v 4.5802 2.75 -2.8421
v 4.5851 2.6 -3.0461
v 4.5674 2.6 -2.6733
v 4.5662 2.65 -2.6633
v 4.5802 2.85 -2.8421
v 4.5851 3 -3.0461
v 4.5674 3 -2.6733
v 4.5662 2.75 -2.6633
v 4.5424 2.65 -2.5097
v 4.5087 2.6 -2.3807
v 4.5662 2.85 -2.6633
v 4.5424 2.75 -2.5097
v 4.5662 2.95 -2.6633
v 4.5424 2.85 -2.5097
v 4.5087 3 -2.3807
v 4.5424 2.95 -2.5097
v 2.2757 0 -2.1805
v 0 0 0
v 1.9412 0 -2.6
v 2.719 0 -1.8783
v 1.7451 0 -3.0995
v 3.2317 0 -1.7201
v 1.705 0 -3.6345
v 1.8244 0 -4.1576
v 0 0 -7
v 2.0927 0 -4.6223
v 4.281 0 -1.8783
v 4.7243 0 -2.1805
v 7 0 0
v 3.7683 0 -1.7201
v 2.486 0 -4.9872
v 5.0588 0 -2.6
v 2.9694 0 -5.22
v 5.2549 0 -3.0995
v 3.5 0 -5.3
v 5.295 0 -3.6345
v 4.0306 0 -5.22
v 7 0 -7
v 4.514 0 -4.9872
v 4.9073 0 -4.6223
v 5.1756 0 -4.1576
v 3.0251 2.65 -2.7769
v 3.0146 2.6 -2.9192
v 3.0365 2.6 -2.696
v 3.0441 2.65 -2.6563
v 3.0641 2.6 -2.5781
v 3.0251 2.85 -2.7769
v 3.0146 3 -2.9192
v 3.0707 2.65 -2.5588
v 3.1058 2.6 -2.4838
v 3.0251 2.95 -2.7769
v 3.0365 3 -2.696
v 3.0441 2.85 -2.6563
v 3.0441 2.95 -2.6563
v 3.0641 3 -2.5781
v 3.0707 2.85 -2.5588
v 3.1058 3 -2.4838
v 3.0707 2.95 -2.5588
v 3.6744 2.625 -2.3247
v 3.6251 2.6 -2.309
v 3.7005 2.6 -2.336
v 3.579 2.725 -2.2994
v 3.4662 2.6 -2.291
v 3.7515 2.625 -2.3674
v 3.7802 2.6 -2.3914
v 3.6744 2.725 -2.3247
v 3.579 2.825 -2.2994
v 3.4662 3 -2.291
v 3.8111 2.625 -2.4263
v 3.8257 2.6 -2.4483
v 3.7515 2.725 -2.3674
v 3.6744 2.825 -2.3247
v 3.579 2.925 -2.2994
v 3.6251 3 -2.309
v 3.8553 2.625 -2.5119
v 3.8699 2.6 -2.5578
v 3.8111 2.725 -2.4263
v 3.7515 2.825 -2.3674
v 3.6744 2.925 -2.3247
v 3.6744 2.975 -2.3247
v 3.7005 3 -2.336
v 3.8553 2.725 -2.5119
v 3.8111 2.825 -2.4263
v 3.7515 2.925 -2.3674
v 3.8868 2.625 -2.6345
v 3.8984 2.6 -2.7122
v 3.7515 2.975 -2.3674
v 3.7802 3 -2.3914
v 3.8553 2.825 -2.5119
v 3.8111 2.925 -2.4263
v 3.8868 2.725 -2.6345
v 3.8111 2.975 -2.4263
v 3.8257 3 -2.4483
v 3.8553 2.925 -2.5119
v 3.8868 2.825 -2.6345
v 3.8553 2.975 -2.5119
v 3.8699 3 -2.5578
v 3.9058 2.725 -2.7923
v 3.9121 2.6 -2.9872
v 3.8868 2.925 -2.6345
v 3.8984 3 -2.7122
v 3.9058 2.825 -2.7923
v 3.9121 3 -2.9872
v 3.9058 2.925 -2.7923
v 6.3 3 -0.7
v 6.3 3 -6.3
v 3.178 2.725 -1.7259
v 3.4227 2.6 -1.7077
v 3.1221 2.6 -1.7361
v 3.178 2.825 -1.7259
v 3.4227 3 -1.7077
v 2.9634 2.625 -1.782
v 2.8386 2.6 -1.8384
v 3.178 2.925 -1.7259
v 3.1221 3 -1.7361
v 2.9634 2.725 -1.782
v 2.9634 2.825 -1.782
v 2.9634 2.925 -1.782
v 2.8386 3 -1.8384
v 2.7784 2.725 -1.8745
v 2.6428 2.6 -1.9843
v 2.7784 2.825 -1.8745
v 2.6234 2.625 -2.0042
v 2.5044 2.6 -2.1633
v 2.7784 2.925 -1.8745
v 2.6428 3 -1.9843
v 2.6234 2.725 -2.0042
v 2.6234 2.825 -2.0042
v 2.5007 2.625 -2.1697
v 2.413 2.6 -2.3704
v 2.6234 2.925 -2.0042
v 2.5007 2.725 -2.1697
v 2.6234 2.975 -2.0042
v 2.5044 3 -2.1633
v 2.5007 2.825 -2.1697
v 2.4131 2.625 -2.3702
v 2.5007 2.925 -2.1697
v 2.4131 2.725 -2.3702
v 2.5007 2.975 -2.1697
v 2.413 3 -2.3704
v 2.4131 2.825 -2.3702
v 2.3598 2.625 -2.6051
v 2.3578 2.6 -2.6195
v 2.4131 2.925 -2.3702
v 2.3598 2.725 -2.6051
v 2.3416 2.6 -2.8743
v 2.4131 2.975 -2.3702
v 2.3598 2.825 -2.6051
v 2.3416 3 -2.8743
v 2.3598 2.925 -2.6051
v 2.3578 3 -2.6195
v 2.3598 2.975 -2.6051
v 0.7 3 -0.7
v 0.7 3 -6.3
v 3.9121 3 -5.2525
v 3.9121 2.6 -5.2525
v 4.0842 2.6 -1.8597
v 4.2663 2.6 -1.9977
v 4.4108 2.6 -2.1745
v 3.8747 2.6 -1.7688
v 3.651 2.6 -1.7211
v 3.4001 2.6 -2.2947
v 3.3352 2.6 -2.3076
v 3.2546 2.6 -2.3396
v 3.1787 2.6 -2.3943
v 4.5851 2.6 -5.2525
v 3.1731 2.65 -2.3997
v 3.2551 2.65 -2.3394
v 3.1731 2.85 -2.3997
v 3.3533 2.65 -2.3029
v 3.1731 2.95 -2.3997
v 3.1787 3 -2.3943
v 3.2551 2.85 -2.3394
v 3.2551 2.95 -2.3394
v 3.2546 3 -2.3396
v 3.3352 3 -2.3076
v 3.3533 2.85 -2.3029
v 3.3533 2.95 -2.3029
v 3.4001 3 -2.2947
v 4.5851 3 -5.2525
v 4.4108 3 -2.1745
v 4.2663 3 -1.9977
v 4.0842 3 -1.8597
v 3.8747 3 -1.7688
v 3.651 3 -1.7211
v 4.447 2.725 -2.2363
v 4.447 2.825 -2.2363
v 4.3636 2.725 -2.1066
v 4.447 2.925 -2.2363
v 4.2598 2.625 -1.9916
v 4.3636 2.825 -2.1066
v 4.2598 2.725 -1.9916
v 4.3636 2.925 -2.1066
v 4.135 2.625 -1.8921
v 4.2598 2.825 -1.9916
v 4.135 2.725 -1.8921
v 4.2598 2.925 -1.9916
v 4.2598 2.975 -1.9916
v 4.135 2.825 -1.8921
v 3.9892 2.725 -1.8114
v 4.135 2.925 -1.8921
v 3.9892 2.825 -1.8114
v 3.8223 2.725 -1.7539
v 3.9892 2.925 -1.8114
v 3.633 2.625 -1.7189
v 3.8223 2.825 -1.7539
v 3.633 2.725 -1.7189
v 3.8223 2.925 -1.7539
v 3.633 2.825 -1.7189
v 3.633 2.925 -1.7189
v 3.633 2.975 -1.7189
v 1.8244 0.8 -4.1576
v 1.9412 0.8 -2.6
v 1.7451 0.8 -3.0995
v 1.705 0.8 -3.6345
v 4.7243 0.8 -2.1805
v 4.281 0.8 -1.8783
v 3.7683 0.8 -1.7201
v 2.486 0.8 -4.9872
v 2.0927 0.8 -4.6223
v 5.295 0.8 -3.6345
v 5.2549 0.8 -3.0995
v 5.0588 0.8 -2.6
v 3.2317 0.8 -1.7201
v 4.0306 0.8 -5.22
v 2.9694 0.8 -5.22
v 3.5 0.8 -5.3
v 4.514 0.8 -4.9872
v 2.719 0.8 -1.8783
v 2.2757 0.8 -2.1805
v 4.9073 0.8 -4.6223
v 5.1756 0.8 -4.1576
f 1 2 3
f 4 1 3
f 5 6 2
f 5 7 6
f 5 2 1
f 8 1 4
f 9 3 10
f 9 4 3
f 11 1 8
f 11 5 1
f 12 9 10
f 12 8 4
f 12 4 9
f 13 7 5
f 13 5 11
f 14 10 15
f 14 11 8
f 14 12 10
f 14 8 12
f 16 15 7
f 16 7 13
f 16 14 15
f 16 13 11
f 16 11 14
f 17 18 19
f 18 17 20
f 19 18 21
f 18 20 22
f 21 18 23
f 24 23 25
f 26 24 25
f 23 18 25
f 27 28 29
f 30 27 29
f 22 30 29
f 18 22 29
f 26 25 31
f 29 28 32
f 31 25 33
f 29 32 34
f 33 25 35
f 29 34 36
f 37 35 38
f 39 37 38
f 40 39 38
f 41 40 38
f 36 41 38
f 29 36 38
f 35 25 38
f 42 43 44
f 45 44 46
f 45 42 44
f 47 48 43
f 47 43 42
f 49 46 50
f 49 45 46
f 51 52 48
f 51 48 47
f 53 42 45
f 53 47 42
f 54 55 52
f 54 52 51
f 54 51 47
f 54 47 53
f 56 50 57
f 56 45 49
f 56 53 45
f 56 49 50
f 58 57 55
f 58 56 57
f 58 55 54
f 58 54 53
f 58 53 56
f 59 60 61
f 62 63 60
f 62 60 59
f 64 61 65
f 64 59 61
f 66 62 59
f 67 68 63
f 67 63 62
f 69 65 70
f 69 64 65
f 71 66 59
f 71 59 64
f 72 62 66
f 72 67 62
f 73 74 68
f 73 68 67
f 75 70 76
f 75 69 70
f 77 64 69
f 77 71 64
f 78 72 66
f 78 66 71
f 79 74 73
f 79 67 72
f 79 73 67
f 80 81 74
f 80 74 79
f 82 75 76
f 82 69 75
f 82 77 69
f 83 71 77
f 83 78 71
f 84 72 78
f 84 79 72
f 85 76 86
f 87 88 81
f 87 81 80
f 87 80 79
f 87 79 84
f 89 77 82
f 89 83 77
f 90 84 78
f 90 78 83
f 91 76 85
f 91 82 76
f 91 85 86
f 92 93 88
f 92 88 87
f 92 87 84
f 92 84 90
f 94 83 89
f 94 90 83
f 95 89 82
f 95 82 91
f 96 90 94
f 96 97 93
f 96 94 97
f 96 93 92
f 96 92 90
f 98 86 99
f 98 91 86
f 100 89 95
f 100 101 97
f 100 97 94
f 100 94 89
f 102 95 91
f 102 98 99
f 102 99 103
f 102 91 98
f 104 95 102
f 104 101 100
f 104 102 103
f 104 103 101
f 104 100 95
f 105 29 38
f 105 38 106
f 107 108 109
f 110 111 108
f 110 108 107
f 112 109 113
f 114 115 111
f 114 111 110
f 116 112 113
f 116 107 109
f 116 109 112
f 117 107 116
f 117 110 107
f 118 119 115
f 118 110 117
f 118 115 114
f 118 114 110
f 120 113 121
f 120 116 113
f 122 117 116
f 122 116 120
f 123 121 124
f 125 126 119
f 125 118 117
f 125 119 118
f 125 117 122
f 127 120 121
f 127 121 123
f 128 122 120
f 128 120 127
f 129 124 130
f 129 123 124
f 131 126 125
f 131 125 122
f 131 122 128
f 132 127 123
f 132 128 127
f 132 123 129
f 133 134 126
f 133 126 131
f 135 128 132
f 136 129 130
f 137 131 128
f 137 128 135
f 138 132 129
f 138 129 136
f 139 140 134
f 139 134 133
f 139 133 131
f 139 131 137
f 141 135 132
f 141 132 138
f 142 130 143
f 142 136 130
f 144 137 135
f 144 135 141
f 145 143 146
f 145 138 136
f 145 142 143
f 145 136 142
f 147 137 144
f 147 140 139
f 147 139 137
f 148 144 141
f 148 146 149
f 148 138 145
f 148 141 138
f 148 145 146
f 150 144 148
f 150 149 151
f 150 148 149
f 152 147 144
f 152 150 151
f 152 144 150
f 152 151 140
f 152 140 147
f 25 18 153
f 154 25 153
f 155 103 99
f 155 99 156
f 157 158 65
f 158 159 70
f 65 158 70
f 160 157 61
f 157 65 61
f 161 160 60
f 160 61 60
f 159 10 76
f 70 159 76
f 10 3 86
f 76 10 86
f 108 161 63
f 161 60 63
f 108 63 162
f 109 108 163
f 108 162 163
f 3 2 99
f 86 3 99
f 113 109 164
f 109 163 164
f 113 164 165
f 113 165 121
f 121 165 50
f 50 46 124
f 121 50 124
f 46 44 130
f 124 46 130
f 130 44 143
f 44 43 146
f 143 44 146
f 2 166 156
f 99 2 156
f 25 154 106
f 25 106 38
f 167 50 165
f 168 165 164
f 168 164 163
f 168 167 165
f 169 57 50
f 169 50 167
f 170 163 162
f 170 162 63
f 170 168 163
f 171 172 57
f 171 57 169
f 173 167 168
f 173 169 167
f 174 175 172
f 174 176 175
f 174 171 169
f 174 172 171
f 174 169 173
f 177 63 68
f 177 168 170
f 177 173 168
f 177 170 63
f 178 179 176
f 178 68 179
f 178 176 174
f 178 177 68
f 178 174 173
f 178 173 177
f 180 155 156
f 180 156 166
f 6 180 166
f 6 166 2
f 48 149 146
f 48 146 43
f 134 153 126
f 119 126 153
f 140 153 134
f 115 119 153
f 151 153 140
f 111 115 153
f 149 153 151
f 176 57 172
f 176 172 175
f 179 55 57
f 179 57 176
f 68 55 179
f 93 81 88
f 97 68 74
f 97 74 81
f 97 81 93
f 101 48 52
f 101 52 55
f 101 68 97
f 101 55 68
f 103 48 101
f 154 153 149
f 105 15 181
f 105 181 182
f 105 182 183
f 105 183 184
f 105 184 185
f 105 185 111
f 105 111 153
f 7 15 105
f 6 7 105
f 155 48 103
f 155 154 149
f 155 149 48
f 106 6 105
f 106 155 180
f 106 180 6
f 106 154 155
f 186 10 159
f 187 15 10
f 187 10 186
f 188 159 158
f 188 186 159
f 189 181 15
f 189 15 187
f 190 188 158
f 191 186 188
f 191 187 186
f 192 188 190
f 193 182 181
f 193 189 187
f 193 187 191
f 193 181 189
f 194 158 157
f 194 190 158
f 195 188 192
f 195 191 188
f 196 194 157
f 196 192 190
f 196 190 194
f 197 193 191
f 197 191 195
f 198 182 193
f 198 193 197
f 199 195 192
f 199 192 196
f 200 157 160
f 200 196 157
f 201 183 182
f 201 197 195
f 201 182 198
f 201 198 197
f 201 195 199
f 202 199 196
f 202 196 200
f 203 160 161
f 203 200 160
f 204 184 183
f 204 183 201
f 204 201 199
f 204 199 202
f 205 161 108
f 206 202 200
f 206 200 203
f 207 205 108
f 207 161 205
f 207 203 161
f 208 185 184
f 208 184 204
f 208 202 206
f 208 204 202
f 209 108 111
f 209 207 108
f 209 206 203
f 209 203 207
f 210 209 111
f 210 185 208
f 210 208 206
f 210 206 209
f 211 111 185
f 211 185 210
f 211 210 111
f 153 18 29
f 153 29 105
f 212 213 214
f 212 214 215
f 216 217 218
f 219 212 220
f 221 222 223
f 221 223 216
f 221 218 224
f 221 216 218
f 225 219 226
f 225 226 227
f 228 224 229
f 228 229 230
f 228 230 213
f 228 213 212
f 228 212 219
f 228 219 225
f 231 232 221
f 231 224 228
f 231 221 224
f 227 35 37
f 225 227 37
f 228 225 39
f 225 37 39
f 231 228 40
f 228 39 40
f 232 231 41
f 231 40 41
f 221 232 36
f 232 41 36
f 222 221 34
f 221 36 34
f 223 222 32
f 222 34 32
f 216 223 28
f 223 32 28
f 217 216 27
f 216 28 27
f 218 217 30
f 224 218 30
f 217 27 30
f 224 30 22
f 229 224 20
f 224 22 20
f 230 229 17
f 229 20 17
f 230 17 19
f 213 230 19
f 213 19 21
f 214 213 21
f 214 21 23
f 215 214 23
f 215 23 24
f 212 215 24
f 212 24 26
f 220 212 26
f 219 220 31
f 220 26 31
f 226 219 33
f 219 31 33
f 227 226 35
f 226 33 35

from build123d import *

# Parameters (mm, degrees)
SKETCH1_W           = 7
SKETCH1_H           = 7
BOSS_EXTRUDE1_DEPTH = 3
CUT_EXTRUDE1_DEPTH  = 7
CUT_EXTRUDE2_DEPTH  = 11
SKETCH4_R           = 1.8
CUT_EXTRUDE3_DEPTH  = 0.8
CUT_EXTRUDE4_DEPTH  = 0.4


with BuildPart() as part:
    # Sketch1 → Boss-Extrude1 (new body)
    with BuildSketch(Plane(origin=(0, 0, 0), x_dir=(1, 0, 0), z_dir=(0, 1, 0))):
        with Locations((3.5, 3.5)):
            Rectangle(SKETCH1_W, SKETCH1_H)
    extrude(amount=BOSS_EXTRUDE1_DEPTH)

    # Sketch2 → Cut-Extrude1 (cut)
    with BuildSketch(Plane.XY):
        Polygon((0, 0), (0.7, 3), (0, 3), align=None)
        Polygon((7, 0), (6.3, 3), (7, 3), align=None)
    extrude(amount=-CUT_EXTRUDE1_DEPTH, mode=Mode.SUBTRACT)

    # Sketch3 → Cut-Extrude2 (cut)
    with BuildSketch(Plane(origin=(0, 0, 0), x_dir=(0, 0, -1), z_dir=(1, 0, 0))):
        Polygon((0, 0), (0.7, 3), (0, 3), align=None)
        Polygon((7, 3), (6.3, 3), (7, 0), align=None)
    extrude(amount=CUT_EXTRUDE2_DEPTH, mode=Mode.SUBTRACT)

    # Sketch4 → Cut-Extrude3 (cut)
    with BuildSketch(Plane.XZ):
        with Locations(Location((3.5, -3.5, 0), (0, 0, 270))):
            Circle(SKETCH4_R)
    extrude(amount=-CUT_EXTRUDE3_DEPTH, mode=Mode.SUBTRACT)

    # Sketch5 → Cut-Extrude4 (cut)
    with BuildSketch(Plane(origin=(0, 3, 0), x_dir=(1, 0, 0), z_dir=(0, 1, 0))):
        with BuildLine():
            Line((3.912067399, 5.252535384), (4.585144322, 5.252535384))
            Line((4.585144322, 5.252535384), (4.585144322, 3.046105095))
            add(Edge.make_bspline(
                [(4.585144322, 3.046105095), (4.584843541, 3.011045712), (4.584259872, 2.943012724), (4.580673506, 2.844127733), (4.575337598, 2.751510265), (4.567129137, 2.665173613), (4.555562948, 2.585304416), (4.543305201, 2.511265579), (4.528422816, 2.443431307), (4.515086598, 2.400993469), (4.508722046, 2.380740512)],
                knots=[0, 0, 0, 0, 1.251619961, 2.428777588, 3.532126049, 4.56323557, 5.523704531, 6.412540087, 7.242403515, 8, 8, 8, 8], degree=3))
            add(Edge.make_bspline(
                [(4.508722046, 2.380740512), (4.499827513, 2.355783352), (4.482224719, 2.306391691), (4.448010513, 2.235936597), (4.408665944, 2.169234852), (4.364301741, 2.105997397), (4.315336945, 2.04597069), (4.260110759, 1.990736894), (4.200565892, 1.938369412), (4.135027413, 1.891038204), (4.06514476, 1.846907146), (3.988927236, 1.810138919), (3.907874454, 1.778333915), (3.821306158, 1.752500626), (3.729197248, 1.73228764), (3.631783693, 1.717575234), (3.528935725, 1.70921534), (3.458690461, 1.708189441), (3.422684386, 1.707663589)],
                knots=[0, 0, 0, 0, 0.925533072, 1.831683394, 2.73255258, 3.630007683, 4.529542467, 5.436465751, 6.357118906, 7.298274949, 8.259461937, 9.242242071, 10.251058183, 11.300341426, 12.396409345, 13.544807631, 14.74152597, 16, 16, 16, 16], degree=3))
            add(Edge.make_bspline(
                [(3.422684386, 1.707663589), (3.380583904, 1.708681136), (3.298736769, 1.71065934), (3.179715358, 1.723792805), (3.068099561, 1.746763788), (2.964225235, 1.779943292), (2.867030957, 1.8211886), (2.777692308, 1.872636461), (2.695734484, 1.93325469), (2.62169044, 2.003229079), (2.555523571, 2.081852015), (2.498409733, 2.169813315), (2.449935297, 2.266193101), (2.410873173, 2.371427394), (2.380033539, 2.485012376), (2.357789346, 2.607187203), (2.344515975, 2.738021444), (2.342560592, 2.828024877), (2.341554578, 2.874330256)],
                knots=[0, 0, 0, 0, 1.114068574, 2.165849827, 3.164101702, 4.124467949, 5.046988974, 5.952942428, 6.846011651, 7.738523925, 8.642829306, 9.558838605, 10.50752403, 11.491963144, 12.524197802, 13.618364352, 14.774685164, 16, 16, 16, 16], degree=3))
            Line((2.341554578, 2.874330256), (3.014631501, 2.919202051))
            add(Edge.make_bspline(
                [(3.014631501, 2.919202051), (3.015840364, 2.894415849), (3.018158425, 2.846886919), (3.024594885, 2.778371834), (3.032733918, 2.715398444), (3.043383675, 2.658155757), (3.054852287, 2.60616009), (3.069750194, 2.560434701), (3.085412304, 2.519371749), (3.099168906, 2.495346649), (3.105777335, 2.483805416)],
                knots=[0, 0, 0, 0, 1.326609226, 2.543847584, 3.678365909, 4.719972403, 5.656527627, 6.521948534, 7.28997025, 8, 8, 8, 8], degree=3))
            add(Edge.make_bspline(
                [(3.105777335, 2.483805416), (3.115894166, 2.468540683), (3.135805351, 2.438497786), (3.17212863, 2.399348731), (3.211125287, 2.365122439), (3.254928677, 2.338213709), (3.302319529, 2.317050802), (3.353653599, 2.301673045), (3.408789357, 2.292348698), (3.446718972, 2.2914549), (3.466153937, 2.290996922)],
                knots=[0, 0, 0, 0, 1.023658308, 2.014687051, 2.979722519, 3.920049697, 4.880550909, 5.878122304, 6.912759386, 8, 8, 8, 8], degree=3))
            add(Edge.make_bspline(
                [(3.466153937, 2.290996922), (3.485804159, 2.291363098), (3.523578154, 2.292067004), (3.578014864, 2.298467893), (3.628066722, 2.308839798), (3.673760989, 2.323419076), (3.715252451, 2.342345121), (3.751621411, 2.366557721), (3.784435046, 2.393802377), (3.812780846, 2.426575807), (3.836932023, 2.466065164), (3.857097159, 2.514128918), (3.874444677, 2.57096477), (3.887851723, 2.637004807), (3.899263762, 2.7116168), (3.906422298, 2.795460452), (3.911567905, 2.88828796), (3.911896247, 2.953314858), (3.912067399, 2.987210865)],
                knots=[0, 0, 0, 0, 0.980314827, 1.884477813, 2.730827652, 3.527503874, 4.27366112, 4.998269146, 5.70163477, 6.396145331, 7.150281155, 8.001758491, 8.990432449, 10.111292654, 11.361572691, 12.75538406, 14.308707205, 16, 16, 16, 16], degree=3))
            Line((3.912067399, 2.987210865), (3.912067399, 5.252535384))
        make_face()
    extrude(amount=-CUT_EXTRUDE4_DEPTH, mode=Mode.SUBTRACT)


solid = part.part
